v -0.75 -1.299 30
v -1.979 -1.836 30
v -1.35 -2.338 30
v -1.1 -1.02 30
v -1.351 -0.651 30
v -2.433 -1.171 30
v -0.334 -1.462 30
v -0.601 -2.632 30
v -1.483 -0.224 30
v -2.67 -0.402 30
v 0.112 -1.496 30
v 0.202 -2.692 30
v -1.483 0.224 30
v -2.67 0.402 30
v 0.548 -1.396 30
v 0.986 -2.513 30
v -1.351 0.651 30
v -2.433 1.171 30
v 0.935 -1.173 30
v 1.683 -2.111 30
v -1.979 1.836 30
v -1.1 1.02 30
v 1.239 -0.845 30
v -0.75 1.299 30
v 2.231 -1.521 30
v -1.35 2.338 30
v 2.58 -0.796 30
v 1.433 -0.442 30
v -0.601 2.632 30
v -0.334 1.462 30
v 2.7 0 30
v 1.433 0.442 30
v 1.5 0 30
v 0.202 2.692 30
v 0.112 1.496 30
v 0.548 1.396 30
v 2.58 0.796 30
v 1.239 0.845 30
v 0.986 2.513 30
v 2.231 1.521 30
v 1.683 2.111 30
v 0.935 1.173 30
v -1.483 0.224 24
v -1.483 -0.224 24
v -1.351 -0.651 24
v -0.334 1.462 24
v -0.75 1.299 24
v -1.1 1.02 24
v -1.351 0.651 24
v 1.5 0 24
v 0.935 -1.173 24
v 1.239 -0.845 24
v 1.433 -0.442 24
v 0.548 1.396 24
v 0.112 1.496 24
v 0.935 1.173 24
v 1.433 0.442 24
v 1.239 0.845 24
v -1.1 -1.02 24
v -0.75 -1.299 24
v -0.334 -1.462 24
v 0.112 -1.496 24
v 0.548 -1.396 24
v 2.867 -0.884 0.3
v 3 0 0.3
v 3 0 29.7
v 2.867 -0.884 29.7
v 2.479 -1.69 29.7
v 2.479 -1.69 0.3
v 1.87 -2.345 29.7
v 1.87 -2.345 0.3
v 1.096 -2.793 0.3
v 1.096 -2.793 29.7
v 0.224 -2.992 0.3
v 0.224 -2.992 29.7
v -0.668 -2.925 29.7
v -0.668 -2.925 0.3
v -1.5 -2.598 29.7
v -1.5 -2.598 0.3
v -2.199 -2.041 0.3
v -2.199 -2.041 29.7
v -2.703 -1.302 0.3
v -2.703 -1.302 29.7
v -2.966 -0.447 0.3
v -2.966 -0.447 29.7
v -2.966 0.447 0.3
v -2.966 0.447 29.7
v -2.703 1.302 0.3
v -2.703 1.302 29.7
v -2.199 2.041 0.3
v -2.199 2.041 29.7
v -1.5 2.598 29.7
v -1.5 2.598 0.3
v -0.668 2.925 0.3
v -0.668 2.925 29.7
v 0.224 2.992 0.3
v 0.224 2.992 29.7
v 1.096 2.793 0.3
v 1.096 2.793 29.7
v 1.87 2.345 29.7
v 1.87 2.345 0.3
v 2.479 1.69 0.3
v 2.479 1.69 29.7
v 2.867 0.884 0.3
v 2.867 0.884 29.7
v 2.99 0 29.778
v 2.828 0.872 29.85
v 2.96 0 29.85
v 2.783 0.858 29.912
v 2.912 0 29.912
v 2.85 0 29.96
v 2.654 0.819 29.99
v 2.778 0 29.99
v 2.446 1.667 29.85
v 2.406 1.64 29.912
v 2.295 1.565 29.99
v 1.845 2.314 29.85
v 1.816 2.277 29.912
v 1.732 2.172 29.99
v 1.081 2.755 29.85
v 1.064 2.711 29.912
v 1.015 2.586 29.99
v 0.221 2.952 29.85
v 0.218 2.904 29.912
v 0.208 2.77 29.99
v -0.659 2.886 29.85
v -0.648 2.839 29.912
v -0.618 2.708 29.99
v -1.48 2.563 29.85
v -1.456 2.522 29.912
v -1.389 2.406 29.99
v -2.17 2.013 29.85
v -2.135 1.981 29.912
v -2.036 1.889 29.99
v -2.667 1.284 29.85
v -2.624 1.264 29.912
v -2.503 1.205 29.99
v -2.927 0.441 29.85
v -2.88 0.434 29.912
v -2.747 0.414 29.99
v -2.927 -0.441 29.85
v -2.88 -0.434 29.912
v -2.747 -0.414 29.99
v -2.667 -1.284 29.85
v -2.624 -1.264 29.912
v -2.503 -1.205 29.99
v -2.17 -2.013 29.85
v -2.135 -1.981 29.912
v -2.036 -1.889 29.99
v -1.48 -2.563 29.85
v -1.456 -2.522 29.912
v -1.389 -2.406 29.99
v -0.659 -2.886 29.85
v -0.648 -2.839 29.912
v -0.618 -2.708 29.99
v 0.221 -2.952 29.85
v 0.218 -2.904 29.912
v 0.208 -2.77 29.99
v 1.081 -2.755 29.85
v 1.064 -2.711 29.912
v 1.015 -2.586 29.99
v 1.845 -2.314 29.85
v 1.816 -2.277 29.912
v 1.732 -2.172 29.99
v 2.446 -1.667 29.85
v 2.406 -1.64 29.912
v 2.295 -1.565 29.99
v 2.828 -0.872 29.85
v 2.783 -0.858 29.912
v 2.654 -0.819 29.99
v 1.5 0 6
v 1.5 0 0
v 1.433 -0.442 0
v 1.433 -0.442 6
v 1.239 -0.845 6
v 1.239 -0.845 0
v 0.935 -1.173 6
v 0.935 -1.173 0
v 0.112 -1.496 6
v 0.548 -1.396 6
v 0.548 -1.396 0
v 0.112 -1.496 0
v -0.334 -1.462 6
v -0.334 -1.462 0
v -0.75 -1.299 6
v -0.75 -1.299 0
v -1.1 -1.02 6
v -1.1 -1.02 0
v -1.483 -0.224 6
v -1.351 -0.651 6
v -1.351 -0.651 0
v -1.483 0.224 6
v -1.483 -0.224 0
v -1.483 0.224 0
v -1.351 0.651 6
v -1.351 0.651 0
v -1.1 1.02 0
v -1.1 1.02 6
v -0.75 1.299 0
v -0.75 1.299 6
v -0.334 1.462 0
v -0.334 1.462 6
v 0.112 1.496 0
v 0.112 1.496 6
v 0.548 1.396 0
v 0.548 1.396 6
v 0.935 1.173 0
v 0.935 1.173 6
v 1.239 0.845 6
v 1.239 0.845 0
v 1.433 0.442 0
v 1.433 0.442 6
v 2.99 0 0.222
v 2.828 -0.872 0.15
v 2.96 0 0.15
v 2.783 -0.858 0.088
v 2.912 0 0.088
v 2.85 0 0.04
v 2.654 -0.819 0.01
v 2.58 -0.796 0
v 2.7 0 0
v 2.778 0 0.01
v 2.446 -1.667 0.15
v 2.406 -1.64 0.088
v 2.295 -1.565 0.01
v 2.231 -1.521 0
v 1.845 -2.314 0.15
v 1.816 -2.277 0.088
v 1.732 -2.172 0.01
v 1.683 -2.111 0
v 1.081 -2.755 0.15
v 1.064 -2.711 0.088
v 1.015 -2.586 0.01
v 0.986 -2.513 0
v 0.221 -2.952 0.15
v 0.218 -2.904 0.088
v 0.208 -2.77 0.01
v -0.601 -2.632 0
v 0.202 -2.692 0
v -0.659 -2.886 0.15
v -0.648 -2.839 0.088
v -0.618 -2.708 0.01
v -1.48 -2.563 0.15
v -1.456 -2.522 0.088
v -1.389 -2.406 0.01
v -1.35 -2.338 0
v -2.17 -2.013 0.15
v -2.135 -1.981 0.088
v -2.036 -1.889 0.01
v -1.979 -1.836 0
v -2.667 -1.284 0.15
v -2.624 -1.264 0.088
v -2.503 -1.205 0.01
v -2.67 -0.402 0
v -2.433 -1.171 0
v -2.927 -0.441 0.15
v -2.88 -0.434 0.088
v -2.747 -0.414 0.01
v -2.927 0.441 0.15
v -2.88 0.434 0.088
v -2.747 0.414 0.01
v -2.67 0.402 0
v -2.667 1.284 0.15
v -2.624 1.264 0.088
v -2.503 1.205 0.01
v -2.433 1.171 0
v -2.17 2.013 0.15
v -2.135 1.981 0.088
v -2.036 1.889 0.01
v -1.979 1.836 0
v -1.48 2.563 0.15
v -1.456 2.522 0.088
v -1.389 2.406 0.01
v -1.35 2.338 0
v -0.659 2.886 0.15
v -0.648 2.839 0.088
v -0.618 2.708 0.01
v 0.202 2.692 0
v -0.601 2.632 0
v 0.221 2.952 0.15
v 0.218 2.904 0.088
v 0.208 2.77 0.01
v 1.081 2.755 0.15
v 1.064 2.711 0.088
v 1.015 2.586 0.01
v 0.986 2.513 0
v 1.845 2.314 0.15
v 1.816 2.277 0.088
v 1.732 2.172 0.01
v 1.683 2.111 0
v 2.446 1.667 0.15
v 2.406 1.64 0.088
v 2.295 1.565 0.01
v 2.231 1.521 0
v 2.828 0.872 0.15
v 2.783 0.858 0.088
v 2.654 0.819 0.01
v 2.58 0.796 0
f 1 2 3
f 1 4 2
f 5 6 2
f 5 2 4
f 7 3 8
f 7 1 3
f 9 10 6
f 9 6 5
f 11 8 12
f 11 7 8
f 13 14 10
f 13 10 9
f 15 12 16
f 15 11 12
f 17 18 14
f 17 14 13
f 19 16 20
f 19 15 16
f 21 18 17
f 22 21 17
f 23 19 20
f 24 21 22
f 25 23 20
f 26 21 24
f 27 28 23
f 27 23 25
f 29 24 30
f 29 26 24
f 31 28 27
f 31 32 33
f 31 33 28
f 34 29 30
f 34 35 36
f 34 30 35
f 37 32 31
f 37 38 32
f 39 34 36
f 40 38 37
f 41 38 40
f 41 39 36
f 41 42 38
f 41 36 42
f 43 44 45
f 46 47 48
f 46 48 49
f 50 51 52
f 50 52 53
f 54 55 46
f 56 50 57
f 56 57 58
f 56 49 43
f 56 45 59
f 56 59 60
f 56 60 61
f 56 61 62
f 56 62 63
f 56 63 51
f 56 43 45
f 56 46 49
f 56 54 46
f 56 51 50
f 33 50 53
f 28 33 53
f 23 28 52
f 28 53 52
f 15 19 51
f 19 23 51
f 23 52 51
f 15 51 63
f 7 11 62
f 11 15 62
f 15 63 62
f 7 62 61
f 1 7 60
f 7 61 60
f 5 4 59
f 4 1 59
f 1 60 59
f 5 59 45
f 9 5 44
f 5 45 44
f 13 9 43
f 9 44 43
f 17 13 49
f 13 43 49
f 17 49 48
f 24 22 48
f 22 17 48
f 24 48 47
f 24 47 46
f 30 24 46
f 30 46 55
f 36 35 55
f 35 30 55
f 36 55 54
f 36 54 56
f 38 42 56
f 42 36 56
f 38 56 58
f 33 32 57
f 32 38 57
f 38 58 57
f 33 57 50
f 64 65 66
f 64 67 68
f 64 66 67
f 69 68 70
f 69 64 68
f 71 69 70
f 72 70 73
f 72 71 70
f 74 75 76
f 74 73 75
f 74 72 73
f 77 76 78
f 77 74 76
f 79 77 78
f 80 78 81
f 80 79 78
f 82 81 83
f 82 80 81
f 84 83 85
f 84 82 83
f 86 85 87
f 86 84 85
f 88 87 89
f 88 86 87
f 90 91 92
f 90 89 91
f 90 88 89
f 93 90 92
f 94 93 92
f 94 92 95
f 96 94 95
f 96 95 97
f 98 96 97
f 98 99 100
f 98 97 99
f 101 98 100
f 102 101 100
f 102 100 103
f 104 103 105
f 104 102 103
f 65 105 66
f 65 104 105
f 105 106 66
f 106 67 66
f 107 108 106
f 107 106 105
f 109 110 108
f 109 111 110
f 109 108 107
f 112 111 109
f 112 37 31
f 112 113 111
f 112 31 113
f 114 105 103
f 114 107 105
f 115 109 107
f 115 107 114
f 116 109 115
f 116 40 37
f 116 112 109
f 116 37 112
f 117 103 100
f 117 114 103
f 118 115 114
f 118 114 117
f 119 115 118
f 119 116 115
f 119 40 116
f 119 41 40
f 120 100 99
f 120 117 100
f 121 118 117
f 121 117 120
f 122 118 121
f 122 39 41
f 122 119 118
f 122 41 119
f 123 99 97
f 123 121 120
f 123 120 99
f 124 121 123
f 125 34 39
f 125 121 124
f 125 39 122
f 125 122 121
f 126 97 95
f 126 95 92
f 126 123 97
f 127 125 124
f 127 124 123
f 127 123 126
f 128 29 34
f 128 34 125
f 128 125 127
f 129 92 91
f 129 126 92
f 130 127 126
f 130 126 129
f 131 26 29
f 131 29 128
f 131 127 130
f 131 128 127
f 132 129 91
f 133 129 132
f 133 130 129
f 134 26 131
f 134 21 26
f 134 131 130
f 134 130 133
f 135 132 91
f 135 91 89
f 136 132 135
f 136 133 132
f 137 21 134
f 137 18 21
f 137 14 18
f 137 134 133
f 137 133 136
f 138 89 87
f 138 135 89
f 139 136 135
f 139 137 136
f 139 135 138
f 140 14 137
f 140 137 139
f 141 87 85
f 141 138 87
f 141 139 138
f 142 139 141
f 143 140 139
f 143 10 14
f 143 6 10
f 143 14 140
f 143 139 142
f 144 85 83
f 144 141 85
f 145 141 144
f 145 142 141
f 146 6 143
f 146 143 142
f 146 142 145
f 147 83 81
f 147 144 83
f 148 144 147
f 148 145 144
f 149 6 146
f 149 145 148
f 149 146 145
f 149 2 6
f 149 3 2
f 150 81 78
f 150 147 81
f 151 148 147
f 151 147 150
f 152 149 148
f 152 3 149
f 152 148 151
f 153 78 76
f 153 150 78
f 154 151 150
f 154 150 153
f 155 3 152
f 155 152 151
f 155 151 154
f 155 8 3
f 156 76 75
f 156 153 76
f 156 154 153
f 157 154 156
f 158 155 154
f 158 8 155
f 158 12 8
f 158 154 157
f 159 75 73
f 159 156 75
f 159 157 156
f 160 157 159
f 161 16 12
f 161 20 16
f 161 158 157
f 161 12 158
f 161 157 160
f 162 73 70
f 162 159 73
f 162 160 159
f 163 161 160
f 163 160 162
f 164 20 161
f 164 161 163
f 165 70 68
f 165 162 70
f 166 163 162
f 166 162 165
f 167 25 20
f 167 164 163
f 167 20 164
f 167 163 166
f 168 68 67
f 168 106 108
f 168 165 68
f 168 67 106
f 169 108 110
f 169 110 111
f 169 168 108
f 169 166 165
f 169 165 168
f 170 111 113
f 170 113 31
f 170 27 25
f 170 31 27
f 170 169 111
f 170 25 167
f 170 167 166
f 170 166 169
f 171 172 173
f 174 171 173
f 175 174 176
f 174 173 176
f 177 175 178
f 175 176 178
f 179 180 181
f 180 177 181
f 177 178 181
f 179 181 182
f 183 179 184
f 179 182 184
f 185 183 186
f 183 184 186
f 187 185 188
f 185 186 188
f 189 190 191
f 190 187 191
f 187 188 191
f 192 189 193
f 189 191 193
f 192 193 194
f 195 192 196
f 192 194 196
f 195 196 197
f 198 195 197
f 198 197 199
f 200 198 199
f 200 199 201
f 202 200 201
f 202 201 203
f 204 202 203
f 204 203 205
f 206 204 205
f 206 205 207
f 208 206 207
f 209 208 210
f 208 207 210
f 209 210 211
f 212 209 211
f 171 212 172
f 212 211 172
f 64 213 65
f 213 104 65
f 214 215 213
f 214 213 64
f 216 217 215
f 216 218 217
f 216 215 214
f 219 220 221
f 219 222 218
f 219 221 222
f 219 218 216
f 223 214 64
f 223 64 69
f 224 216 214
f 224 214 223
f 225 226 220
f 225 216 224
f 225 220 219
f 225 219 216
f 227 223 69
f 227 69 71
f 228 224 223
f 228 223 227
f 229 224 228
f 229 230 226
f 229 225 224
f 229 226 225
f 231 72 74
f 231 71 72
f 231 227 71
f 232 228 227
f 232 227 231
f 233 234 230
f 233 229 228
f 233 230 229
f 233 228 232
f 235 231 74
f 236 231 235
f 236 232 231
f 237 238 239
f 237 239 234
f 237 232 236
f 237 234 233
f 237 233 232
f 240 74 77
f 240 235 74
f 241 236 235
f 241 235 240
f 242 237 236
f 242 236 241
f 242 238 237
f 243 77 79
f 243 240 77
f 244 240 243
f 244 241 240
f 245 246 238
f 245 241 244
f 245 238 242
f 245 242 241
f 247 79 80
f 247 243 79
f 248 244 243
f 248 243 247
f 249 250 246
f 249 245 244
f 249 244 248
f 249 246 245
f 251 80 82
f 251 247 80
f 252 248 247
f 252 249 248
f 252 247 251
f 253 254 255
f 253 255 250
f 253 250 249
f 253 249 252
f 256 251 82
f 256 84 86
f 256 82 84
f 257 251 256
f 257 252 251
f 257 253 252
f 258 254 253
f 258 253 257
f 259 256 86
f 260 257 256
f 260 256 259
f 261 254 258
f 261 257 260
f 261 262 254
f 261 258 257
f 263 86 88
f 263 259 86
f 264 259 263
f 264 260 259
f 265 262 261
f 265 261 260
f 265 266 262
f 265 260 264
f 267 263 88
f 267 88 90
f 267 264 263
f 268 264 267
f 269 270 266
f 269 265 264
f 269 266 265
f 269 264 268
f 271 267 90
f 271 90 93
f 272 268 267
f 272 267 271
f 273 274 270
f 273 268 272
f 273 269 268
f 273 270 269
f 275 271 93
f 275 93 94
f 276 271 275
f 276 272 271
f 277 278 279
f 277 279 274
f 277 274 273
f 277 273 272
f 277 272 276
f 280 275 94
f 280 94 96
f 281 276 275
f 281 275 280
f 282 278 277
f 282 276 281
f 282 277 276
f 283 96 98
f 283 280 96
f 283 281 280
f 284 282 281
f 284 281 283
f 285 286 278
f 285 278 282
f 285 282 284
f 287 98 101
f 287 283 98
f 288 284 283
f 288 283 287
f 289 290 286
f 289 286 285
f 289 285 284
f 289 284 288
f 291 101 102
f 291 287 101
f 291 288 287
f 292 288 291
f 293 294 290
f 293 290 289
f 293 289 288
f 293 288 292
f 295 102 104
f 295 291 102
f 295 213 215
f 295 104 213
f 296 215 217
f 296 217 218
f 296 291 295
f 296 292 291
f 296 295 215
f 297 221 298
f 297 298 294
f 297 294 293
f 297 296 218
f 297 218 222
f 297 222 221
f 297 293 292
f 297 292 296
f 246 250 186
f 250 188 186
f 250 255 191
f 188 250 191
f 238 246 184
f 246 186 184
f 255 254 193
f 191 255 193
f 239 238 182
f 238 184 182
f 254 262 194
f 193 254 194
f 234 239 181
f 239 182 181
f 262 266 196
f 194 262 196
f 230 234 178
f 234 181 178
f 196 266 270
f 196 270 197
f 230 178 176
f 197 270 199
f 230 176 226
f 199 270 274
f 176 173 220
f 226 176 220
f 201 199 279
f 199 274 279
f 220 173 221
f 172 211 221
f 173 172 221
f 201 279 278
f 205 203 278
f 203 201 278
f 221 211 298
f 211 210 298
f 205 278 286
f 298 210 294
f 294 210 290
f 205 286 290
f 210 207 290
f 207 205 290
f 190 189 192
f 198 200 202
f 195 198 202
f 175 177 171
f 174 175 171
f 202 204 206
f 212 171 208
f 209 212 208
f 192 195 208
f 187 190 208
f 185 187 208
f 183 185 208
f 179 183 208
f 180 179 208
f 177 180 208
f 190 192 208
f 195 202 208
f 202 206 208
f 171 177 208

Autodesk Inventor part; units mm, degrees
ref_plane "YZ Plane" through (0, 0, 0) normal (1, 0, 0) x (0, 1, 0)
ref_plane "XZ Plane" through (0, 0, 0) normal (0, 1, 0) x (-1, 0, 0)
ref_plane "XY Plane" through (0, 0, 0) normal (0, 0, 1) x (1, 0, 0)
sketch "スケッチ1" plane through (0, 0, 0) normal (0, 0, 1) x (1, 0, 0)
  circle A0 centre (0, 0) radius 3
  circle A1 centre (0, 0) radius 1.5
  dimension "d0" = 6
  dimension "d1" = 3
extrude "押し出し1" add sketch "スケッチ1" along normal blind 30
fillet "フィレット1" radius 0.3 2 edges at (-3, 0, 30) (-3, 0, 0)
thread "ねじ1" size "M3x0.5" class "6H" standard "ANSI Metric M Profile" length 100
extrude "押し出し2" add sketch "スケッチ1" along normal blind 24 contours A1
extrude "押し出し3" cut sketch "スケッチ1" along normal blind 6 contours A1
thread "ねじ2" size "M3x0.5" class "6H" standard "ANSI Metric M Profile" full length
properties part number "スペーサーM3L30アルミ" material "アルミニウム 2014-T4"
